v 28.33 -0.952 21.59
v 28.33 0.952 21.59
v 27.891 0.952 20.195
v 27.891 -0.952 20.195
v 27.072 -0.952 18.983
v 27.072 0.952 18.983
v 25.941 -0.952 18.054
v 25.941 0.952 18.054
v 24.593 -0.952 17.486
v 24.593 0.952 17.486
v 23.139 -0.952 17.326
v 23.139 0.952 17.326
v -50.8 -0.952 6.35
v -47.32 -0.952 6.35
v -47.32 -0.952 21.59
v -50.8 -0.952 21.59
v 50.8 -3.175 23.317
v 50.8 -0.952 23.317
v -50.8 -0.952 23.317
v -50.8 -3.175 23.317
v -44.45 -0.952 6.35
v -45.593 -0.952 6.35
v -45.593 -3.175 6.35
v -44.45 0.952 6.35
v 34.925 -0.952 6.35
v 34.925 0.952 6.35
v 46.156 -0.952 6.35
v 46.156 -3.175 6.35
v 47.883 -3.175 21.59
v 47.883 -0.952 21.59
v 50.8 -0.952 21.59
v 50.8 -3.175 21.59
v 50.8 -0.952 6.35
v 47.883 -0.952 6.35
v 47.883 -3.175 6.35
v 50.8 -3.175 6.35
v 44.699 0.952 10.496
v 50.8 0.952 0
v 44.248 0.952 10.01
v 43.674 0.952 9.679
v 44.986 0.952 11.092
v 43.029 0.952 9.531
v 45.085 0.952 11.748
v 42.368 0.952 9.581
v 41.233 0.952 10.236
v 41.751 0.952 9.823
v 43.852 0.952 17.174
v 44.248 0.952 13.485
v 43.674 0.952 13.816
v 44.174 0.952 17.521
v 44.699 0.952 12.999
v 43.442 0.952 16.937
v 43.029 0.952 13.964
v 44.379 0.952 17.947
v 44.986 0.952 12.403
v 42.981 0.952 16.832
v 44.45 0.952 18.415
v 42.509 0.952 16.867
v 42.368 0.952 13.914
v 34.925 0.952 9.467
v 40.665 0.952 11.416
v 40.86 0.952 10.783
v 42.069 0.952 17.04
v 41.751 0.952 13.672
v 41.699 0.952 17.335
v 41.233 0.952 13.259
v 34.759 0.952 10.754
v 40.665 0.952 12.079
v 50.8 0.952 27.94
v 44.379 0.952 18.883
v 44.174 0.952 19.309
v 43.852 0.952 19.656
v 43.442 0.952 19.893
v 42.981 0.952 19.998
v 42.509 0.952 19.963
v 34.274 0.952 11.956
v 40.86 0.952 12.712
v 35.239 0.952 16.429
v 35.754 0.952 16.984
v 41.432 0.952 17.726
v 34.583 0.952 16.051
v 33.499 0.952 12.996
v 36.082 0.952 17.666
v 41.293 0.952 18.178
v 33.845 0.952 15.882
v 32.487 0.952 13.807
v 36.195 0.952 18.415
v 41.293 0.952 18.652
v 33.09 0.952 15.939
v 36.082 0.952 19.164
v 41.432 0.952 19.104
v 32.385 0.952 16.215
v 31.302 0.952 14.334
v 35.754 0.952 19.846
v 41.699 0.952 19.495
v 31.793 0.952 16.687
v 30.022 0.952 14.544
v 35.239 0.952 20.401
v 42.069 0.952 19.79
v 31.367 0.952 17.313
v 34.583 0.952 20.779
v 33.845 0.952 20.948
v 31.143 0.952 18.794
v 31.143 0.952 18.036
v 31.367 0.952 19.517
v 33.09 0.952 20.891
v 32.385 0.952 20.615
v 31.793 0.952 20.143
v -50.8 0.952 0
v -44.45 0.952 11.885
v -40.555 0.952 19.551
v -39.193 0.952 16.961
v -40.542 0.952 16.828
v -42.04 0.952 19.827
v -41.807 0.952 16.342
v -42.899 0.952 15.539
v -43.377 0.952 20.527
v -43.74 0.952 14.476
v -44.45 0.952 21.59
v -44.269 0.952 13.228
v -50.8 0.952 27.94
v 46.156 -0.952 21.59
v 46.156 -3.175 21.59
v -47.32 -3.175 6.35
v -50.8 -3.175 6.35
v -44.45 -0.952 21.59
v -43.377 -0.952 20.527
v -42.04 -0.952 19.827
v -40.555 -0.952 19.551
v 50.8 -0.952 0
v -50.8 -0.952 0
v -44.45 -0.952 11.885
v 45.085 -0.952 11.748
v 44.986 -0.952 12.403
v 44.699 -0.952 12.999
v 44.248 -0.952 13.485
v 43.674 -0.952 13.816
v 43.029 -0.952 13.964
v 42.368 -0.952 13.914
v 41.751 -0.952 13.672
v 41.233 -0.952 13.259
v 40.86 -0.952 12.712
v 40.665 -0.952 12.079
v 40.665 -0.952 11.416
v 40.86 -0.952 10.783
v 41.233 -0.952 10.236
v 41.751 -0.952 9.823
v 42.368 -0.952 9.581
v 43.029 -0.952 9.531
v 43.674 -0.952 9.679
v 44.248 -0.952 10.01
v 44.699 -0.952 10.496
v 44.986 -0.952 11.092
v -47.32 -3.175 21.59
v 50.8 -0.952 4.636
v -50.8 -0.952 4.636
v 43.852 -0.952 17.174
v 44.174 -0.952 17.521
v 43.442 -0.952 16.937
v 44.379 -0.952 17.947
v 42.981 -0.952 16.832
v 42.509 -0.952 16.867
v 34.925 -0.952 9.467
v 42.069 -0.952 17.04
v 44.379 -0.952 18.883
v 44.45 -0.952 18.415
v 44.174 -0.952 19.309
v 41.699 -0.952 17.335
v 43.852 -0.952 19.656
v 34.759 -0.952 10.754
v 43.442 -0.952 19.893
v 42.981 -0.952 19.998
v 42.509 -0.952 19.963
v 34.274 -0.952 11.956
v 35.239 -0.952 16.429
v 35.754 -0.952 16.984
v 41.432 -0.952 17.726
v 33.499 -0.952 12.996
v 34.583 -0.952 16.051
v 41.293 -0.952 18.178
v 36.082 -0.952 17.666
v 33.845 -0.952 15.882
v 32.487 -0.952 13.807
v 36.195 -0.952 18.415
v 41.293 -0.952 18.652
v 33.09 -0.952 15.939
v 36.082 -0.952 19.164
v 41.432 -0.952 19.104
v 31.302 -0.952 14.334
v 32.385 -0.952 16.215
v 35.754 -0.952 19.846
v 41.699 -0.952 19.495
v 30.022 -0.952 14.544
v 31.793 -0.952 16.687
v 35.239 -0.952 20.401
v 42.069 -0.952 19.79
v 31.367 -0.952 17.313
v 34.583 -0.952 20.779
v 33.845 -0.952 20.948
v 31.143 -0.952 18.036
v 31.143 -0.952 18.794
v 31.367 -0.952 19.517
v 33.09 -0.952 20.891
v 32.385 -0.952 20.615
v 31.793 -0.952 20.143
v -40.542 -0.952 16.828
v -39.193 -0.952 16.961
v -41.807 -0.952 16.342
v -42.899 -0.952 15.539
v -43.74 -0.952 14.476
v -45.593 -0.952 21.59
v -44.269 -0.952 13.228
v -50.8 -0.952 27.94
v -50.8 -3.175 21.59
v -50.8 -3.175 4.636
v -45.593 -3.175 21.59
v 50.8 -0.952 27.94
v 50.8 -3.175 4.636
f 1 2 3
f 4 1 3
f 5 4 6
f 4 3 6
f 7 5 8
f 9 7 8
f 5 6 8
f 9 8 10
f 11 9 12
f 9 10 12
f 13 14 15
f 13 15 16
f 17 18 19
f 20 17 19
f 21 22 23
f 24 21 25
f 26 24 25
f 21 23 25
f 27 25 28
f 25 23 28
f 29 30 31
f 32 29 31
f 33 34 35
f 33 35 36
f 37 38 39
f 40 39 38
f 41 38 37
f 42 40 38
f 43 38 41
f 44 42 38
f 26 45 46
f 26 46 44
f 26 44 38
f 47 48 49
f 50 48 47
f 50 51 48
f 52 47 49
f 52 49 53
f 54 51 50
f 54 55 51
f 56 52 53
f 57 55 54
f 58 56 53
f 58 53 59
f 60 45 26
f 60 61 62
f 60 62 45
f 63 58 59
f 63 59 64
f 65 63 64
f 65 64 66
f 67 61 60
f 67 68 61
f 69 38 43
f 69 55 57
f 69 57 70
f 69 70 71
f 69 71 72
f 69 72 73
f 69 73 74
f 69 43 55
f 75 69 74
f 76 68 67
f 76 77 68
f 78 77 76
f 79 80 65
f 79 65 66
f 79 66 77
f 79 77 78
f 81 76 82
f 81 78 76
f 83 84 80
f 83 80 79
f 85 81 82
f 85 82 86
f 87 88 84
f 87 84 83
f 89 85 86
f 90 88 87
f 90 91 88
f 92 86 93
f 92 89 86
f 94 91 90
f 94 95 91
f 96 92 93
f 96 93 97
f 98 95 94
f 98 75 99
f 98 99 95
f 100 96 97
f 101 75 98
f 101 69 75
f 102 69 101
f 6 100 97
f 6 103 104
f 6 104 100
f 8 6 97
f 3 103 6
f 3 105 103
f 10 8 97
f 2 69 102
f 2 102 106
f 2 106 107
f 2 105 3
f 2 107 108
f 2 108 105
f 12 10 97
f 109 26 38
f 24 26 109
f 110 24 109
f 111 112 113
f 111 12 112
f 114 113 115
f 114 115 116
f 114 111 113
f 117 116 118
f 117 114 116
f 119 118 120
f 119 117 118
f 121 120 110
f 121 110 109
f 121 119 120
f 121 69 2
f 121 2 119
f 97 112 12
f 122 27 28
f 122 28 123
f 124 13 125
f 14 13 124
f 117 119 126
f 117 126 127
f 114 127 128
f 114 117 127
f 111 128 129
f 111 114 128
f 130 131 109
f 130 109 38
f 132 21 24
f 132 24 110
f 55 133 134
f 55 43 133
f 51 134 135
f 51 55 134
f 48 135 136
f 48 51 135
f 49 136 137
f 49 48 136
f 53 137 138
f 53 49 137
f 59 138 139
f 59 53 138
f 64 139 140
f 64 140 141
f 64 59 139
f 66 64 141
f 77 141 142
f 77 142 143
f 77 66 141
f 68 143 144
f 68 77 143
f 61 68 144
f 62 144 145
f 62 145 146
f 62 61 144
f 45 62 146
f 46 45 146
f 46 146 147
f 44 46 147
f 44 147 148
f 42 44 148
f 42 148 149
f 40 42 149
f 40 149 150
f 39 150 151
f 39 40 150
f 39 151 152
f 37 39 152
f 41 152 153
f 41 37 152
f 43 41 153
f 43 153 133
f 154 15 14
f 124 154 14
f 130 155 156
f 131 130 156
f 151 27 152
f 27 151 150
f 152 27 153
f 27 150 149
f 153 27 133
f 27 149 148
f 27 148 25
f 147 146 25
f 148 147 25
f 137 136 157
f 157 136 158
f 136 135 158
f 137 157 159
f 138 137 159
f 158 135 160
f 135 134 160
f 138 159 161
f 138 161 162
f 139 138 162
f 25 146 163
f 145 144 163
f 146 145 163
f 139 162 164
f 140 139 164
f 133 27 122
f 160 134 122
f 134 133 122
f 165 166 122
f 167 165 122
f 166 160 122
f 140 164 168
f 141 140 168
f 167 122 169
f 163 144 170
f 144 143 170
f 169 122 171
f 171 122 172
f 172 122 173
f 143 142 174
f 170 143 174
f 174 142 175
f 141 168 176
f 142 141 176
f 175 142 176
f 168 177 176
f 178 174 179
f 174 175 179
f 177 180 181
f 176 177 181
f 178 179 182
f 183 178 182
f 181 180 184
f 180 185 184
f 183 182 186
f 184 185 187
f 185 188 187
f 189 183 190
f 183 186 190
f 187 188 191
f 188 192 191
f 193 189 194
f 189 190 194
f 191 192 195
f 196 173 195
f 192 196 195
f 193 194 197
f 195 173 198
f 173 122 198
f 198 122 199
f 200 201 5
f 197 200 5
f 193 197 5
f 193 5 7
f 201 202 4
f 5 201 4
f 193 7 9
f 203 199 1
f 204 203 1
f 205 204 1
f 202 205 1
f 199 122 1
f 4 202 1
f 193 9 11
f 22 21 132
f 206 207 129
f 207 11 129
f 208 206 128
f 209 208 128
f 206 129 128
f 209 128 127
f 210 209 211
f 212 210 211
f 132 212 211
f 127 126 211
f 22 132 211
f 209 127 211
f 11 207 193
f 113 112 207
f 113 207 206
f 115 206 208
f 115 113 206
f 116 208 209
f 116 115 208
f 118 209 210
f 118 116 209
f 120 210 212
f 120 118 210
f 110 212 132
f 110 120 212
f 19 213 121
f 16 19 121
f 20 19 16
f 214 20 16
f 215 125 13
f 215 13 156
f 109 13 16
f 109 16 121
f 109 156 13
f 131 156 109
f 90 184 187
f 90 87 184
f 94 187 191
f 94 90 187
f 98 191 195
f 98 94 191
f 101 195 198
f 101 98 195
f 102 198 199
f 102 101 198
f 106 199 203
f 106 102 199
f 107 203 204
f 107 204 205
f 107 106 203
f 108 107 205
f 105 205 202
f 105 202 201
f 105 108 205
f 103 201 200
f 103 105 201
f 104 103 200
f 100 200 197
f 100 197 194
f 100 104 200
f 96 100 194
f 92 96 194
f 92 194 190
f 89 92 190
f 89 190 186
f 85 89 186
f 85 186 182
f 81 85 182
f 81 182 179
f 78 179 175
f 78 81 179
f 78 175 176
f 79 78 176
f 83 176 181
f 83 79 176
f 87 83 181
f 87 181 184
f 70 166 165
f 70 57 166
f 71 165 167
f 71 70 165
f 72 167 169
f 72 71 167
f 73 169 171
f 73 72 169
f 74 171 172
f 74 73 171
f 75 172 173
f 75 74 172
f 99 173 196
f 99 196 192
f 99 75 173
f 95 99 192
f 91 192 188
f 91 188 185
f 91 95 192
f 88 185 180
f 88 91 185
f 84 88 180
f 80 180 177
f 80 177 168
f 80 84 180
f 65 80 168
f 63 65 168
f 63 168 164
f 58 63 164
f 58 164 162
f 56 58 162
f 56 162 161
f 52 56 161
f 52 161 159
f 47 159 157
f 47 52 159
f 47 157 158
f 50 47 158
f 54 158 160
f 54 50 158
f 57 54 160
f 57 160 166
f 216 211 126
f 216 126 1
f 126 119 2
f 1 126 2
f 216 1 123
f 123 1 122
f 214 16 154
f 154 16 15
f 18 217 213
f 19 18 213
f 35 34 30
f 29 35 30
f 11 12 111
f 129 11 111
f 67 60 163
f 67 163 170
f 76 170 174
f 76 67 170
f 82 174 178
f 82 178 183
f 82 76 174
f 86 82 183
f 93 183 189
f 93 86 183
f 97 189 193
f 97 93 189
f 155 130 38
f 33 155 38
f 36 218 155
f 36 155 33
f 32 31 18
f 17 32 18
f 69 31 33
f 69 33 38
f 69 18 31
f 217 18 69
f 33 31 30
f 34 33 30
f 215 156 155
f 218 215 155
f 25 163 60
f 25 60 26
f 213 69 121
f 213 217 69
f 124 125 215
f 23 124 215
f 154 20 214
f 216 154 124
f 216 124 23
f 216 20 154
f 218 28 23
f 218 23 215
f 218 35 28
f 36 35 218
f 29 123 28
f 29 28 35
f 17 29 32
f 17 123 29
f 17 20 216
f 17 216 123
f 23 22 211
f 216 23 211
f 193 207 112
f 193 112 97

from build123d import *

# Parameters (mm, degrees)
F0_R        = 2.2225
F0_R_2      = 2.54
F0_R_3      = 1.5875
F0_W        = 79.375
F0_H        = 6.35
F1_DEPTH    = 0.9525
F2_T1_DEPTH = 1.905
F3_W        = 3.4798
F3_H        = 1.7145
F3_W_2      = 1.7272
F3_H_2      = 15.24
F3_W_3      = 91.7488066308
F3_H_3      = 1.7272
F3_W_4      = 2.9169933692
F4_DEPTH    = 3.175


# Not quite as in the source:
# - a fillet or chamfer that OpenCascade refuses, or shapes differently, is made with other operations: its cross-section is extruded or revolved along the edge and cut away or added
# - a feature names something its author has since deleted; it is built from what else it names


with BuildPart() as f1:
    # F0 (on Front) → F1 (new body, symmetric)
    with BuildSketch(Plane.XZ):
        Polygon((-50.8, 27.94), (-50.8, 0), (-44.45, 0), (-44.45, 6.35), (-44.45, 17.145), (34.925, 14.3731639216), (34.925, 6.35), (34.925, 0), (50.8, 0), (50.8, 27.94), align=None)
        with Locations((42.8625, 11.7475)):
            Circle(F0_R, mode=Mode.SUBTRACT)
        Polygon((-44.45, 21.59), (28.3304192035, 21.59), (28.3304192035, 17.145), (-44.45, 19.6865482425), align=None, mode=Mode.SUBTRACT)
        with Locations((33.655, 18.415)):
            Circle(F0_R_2, mode=Mode.SUBTRACT)
        with Locations((42.8625, 18.415)):
            Circle(F0_R_3, mode=Mode.SUBTRACT)
        with Locations((-4.7625, 3.175)):
            Rectangle(F0_W, F0_H)
    extrude(amount=F1_DEPTH, both=True)

    # F2: fillet of radius 5.08 on 4 edges, made by hand

    # F2_s2 → F2_t1 (join)
    with BuildSketch(Plane.XZ.offset(-0.9525)):
        with BuildLine():
            ThreePointArc((-39.1927105568, 16.9614114072), (-42.8988645219, 15.5387521917), (-44.45, 11.8845060059))
            Line((-44.45, 11.8845060059), (-44.45, 17.145))
            Line((-44.45, 17.145), (-39.1927105568, 16.9614114072))
        make_face()
        with BuildLine():
            ThreePointArc((34.925, 9.4674649456), (33.4992461857, 12.9963294675), (30.0222894432, 14.5443703468))
            Line((30.0222894432, 14.5443703468), (34.925, 14.3731639216))
            Line((34.925, 14.3731639216), (34.925, 9.4674649456))
        make_face()
        with BuildLine():
            ThreePointArc((-44.45, 21.59), (-42.7347440797, 20.1271540197), (-40.5553991831, 19.5505457851))
            Line((-40.5553991831, 19.5505457851), (-44.45, 19.6865482425))
            Line((-44.45, 19.6865482425), (-44.45, 21.59))
        make_face()
        with BuildLine():
            ThreePointArc((28.3304192035, 21.59), (26.5399663684, 18.4773950775), (23.1386411982, 17.326300883))
            Line((23.1386411982, 17.326300883), (28.3304192035, 17.145))
            Line((28.3304192035, 17.145), (28.3304192035, 21.59))
        make_face()
    extrude(amount=F2_T1_DEPTH)

    # F3 (on Front) → F4 (join)
    with BuildSketch(Plane.XZ):
        with Locations((-49.0601, 5.49275)):
            Rectangle(F3_W, F3_H)
        with Locations((-46.4566, 13.97)):
            Rectangle(F3_W_2, F3_H_2)
        with Locations((-46.4566, 5.49275)):
            Rectangle(F3_W_2, F3_H)
        with Locations((0.2814033154, 5.49275)):
            Rectangle(F3_W_3, F3_H)
        with Locations((-46.4566, 22.4536)):
            Rectangle(F3_W_2, F3_H_3)
        with Locations((-49.0601, 22.4536)):
            Rectangle(F3_W, F3_H_3)
        with Locations((47.0194066308, 13.97)):
            Rectangle(F3_W_2, F3_H_2)
        with Locations((47.0194066308, 5.49275)):
            Rectangle(F3_W_2, F3_H)
        with Locations((0.2814033154, 22.4536)):
            Rectangle(F3_W_3, F3_H_3)
        with Locations((49.3415033154, 5.49275)):
            Rectangle(F3_W_4, F3_H)
        with Locations((47.0194066308, 22.4536)):
            Rectangle(F3_W_2, F3_H_3)
        with Locations((49.3415033154, 22.4536)):
            Rectangle(F3_W_4, F3_H_3)
    extrude(amount=F4_DEPTH)


solid = f1.part
